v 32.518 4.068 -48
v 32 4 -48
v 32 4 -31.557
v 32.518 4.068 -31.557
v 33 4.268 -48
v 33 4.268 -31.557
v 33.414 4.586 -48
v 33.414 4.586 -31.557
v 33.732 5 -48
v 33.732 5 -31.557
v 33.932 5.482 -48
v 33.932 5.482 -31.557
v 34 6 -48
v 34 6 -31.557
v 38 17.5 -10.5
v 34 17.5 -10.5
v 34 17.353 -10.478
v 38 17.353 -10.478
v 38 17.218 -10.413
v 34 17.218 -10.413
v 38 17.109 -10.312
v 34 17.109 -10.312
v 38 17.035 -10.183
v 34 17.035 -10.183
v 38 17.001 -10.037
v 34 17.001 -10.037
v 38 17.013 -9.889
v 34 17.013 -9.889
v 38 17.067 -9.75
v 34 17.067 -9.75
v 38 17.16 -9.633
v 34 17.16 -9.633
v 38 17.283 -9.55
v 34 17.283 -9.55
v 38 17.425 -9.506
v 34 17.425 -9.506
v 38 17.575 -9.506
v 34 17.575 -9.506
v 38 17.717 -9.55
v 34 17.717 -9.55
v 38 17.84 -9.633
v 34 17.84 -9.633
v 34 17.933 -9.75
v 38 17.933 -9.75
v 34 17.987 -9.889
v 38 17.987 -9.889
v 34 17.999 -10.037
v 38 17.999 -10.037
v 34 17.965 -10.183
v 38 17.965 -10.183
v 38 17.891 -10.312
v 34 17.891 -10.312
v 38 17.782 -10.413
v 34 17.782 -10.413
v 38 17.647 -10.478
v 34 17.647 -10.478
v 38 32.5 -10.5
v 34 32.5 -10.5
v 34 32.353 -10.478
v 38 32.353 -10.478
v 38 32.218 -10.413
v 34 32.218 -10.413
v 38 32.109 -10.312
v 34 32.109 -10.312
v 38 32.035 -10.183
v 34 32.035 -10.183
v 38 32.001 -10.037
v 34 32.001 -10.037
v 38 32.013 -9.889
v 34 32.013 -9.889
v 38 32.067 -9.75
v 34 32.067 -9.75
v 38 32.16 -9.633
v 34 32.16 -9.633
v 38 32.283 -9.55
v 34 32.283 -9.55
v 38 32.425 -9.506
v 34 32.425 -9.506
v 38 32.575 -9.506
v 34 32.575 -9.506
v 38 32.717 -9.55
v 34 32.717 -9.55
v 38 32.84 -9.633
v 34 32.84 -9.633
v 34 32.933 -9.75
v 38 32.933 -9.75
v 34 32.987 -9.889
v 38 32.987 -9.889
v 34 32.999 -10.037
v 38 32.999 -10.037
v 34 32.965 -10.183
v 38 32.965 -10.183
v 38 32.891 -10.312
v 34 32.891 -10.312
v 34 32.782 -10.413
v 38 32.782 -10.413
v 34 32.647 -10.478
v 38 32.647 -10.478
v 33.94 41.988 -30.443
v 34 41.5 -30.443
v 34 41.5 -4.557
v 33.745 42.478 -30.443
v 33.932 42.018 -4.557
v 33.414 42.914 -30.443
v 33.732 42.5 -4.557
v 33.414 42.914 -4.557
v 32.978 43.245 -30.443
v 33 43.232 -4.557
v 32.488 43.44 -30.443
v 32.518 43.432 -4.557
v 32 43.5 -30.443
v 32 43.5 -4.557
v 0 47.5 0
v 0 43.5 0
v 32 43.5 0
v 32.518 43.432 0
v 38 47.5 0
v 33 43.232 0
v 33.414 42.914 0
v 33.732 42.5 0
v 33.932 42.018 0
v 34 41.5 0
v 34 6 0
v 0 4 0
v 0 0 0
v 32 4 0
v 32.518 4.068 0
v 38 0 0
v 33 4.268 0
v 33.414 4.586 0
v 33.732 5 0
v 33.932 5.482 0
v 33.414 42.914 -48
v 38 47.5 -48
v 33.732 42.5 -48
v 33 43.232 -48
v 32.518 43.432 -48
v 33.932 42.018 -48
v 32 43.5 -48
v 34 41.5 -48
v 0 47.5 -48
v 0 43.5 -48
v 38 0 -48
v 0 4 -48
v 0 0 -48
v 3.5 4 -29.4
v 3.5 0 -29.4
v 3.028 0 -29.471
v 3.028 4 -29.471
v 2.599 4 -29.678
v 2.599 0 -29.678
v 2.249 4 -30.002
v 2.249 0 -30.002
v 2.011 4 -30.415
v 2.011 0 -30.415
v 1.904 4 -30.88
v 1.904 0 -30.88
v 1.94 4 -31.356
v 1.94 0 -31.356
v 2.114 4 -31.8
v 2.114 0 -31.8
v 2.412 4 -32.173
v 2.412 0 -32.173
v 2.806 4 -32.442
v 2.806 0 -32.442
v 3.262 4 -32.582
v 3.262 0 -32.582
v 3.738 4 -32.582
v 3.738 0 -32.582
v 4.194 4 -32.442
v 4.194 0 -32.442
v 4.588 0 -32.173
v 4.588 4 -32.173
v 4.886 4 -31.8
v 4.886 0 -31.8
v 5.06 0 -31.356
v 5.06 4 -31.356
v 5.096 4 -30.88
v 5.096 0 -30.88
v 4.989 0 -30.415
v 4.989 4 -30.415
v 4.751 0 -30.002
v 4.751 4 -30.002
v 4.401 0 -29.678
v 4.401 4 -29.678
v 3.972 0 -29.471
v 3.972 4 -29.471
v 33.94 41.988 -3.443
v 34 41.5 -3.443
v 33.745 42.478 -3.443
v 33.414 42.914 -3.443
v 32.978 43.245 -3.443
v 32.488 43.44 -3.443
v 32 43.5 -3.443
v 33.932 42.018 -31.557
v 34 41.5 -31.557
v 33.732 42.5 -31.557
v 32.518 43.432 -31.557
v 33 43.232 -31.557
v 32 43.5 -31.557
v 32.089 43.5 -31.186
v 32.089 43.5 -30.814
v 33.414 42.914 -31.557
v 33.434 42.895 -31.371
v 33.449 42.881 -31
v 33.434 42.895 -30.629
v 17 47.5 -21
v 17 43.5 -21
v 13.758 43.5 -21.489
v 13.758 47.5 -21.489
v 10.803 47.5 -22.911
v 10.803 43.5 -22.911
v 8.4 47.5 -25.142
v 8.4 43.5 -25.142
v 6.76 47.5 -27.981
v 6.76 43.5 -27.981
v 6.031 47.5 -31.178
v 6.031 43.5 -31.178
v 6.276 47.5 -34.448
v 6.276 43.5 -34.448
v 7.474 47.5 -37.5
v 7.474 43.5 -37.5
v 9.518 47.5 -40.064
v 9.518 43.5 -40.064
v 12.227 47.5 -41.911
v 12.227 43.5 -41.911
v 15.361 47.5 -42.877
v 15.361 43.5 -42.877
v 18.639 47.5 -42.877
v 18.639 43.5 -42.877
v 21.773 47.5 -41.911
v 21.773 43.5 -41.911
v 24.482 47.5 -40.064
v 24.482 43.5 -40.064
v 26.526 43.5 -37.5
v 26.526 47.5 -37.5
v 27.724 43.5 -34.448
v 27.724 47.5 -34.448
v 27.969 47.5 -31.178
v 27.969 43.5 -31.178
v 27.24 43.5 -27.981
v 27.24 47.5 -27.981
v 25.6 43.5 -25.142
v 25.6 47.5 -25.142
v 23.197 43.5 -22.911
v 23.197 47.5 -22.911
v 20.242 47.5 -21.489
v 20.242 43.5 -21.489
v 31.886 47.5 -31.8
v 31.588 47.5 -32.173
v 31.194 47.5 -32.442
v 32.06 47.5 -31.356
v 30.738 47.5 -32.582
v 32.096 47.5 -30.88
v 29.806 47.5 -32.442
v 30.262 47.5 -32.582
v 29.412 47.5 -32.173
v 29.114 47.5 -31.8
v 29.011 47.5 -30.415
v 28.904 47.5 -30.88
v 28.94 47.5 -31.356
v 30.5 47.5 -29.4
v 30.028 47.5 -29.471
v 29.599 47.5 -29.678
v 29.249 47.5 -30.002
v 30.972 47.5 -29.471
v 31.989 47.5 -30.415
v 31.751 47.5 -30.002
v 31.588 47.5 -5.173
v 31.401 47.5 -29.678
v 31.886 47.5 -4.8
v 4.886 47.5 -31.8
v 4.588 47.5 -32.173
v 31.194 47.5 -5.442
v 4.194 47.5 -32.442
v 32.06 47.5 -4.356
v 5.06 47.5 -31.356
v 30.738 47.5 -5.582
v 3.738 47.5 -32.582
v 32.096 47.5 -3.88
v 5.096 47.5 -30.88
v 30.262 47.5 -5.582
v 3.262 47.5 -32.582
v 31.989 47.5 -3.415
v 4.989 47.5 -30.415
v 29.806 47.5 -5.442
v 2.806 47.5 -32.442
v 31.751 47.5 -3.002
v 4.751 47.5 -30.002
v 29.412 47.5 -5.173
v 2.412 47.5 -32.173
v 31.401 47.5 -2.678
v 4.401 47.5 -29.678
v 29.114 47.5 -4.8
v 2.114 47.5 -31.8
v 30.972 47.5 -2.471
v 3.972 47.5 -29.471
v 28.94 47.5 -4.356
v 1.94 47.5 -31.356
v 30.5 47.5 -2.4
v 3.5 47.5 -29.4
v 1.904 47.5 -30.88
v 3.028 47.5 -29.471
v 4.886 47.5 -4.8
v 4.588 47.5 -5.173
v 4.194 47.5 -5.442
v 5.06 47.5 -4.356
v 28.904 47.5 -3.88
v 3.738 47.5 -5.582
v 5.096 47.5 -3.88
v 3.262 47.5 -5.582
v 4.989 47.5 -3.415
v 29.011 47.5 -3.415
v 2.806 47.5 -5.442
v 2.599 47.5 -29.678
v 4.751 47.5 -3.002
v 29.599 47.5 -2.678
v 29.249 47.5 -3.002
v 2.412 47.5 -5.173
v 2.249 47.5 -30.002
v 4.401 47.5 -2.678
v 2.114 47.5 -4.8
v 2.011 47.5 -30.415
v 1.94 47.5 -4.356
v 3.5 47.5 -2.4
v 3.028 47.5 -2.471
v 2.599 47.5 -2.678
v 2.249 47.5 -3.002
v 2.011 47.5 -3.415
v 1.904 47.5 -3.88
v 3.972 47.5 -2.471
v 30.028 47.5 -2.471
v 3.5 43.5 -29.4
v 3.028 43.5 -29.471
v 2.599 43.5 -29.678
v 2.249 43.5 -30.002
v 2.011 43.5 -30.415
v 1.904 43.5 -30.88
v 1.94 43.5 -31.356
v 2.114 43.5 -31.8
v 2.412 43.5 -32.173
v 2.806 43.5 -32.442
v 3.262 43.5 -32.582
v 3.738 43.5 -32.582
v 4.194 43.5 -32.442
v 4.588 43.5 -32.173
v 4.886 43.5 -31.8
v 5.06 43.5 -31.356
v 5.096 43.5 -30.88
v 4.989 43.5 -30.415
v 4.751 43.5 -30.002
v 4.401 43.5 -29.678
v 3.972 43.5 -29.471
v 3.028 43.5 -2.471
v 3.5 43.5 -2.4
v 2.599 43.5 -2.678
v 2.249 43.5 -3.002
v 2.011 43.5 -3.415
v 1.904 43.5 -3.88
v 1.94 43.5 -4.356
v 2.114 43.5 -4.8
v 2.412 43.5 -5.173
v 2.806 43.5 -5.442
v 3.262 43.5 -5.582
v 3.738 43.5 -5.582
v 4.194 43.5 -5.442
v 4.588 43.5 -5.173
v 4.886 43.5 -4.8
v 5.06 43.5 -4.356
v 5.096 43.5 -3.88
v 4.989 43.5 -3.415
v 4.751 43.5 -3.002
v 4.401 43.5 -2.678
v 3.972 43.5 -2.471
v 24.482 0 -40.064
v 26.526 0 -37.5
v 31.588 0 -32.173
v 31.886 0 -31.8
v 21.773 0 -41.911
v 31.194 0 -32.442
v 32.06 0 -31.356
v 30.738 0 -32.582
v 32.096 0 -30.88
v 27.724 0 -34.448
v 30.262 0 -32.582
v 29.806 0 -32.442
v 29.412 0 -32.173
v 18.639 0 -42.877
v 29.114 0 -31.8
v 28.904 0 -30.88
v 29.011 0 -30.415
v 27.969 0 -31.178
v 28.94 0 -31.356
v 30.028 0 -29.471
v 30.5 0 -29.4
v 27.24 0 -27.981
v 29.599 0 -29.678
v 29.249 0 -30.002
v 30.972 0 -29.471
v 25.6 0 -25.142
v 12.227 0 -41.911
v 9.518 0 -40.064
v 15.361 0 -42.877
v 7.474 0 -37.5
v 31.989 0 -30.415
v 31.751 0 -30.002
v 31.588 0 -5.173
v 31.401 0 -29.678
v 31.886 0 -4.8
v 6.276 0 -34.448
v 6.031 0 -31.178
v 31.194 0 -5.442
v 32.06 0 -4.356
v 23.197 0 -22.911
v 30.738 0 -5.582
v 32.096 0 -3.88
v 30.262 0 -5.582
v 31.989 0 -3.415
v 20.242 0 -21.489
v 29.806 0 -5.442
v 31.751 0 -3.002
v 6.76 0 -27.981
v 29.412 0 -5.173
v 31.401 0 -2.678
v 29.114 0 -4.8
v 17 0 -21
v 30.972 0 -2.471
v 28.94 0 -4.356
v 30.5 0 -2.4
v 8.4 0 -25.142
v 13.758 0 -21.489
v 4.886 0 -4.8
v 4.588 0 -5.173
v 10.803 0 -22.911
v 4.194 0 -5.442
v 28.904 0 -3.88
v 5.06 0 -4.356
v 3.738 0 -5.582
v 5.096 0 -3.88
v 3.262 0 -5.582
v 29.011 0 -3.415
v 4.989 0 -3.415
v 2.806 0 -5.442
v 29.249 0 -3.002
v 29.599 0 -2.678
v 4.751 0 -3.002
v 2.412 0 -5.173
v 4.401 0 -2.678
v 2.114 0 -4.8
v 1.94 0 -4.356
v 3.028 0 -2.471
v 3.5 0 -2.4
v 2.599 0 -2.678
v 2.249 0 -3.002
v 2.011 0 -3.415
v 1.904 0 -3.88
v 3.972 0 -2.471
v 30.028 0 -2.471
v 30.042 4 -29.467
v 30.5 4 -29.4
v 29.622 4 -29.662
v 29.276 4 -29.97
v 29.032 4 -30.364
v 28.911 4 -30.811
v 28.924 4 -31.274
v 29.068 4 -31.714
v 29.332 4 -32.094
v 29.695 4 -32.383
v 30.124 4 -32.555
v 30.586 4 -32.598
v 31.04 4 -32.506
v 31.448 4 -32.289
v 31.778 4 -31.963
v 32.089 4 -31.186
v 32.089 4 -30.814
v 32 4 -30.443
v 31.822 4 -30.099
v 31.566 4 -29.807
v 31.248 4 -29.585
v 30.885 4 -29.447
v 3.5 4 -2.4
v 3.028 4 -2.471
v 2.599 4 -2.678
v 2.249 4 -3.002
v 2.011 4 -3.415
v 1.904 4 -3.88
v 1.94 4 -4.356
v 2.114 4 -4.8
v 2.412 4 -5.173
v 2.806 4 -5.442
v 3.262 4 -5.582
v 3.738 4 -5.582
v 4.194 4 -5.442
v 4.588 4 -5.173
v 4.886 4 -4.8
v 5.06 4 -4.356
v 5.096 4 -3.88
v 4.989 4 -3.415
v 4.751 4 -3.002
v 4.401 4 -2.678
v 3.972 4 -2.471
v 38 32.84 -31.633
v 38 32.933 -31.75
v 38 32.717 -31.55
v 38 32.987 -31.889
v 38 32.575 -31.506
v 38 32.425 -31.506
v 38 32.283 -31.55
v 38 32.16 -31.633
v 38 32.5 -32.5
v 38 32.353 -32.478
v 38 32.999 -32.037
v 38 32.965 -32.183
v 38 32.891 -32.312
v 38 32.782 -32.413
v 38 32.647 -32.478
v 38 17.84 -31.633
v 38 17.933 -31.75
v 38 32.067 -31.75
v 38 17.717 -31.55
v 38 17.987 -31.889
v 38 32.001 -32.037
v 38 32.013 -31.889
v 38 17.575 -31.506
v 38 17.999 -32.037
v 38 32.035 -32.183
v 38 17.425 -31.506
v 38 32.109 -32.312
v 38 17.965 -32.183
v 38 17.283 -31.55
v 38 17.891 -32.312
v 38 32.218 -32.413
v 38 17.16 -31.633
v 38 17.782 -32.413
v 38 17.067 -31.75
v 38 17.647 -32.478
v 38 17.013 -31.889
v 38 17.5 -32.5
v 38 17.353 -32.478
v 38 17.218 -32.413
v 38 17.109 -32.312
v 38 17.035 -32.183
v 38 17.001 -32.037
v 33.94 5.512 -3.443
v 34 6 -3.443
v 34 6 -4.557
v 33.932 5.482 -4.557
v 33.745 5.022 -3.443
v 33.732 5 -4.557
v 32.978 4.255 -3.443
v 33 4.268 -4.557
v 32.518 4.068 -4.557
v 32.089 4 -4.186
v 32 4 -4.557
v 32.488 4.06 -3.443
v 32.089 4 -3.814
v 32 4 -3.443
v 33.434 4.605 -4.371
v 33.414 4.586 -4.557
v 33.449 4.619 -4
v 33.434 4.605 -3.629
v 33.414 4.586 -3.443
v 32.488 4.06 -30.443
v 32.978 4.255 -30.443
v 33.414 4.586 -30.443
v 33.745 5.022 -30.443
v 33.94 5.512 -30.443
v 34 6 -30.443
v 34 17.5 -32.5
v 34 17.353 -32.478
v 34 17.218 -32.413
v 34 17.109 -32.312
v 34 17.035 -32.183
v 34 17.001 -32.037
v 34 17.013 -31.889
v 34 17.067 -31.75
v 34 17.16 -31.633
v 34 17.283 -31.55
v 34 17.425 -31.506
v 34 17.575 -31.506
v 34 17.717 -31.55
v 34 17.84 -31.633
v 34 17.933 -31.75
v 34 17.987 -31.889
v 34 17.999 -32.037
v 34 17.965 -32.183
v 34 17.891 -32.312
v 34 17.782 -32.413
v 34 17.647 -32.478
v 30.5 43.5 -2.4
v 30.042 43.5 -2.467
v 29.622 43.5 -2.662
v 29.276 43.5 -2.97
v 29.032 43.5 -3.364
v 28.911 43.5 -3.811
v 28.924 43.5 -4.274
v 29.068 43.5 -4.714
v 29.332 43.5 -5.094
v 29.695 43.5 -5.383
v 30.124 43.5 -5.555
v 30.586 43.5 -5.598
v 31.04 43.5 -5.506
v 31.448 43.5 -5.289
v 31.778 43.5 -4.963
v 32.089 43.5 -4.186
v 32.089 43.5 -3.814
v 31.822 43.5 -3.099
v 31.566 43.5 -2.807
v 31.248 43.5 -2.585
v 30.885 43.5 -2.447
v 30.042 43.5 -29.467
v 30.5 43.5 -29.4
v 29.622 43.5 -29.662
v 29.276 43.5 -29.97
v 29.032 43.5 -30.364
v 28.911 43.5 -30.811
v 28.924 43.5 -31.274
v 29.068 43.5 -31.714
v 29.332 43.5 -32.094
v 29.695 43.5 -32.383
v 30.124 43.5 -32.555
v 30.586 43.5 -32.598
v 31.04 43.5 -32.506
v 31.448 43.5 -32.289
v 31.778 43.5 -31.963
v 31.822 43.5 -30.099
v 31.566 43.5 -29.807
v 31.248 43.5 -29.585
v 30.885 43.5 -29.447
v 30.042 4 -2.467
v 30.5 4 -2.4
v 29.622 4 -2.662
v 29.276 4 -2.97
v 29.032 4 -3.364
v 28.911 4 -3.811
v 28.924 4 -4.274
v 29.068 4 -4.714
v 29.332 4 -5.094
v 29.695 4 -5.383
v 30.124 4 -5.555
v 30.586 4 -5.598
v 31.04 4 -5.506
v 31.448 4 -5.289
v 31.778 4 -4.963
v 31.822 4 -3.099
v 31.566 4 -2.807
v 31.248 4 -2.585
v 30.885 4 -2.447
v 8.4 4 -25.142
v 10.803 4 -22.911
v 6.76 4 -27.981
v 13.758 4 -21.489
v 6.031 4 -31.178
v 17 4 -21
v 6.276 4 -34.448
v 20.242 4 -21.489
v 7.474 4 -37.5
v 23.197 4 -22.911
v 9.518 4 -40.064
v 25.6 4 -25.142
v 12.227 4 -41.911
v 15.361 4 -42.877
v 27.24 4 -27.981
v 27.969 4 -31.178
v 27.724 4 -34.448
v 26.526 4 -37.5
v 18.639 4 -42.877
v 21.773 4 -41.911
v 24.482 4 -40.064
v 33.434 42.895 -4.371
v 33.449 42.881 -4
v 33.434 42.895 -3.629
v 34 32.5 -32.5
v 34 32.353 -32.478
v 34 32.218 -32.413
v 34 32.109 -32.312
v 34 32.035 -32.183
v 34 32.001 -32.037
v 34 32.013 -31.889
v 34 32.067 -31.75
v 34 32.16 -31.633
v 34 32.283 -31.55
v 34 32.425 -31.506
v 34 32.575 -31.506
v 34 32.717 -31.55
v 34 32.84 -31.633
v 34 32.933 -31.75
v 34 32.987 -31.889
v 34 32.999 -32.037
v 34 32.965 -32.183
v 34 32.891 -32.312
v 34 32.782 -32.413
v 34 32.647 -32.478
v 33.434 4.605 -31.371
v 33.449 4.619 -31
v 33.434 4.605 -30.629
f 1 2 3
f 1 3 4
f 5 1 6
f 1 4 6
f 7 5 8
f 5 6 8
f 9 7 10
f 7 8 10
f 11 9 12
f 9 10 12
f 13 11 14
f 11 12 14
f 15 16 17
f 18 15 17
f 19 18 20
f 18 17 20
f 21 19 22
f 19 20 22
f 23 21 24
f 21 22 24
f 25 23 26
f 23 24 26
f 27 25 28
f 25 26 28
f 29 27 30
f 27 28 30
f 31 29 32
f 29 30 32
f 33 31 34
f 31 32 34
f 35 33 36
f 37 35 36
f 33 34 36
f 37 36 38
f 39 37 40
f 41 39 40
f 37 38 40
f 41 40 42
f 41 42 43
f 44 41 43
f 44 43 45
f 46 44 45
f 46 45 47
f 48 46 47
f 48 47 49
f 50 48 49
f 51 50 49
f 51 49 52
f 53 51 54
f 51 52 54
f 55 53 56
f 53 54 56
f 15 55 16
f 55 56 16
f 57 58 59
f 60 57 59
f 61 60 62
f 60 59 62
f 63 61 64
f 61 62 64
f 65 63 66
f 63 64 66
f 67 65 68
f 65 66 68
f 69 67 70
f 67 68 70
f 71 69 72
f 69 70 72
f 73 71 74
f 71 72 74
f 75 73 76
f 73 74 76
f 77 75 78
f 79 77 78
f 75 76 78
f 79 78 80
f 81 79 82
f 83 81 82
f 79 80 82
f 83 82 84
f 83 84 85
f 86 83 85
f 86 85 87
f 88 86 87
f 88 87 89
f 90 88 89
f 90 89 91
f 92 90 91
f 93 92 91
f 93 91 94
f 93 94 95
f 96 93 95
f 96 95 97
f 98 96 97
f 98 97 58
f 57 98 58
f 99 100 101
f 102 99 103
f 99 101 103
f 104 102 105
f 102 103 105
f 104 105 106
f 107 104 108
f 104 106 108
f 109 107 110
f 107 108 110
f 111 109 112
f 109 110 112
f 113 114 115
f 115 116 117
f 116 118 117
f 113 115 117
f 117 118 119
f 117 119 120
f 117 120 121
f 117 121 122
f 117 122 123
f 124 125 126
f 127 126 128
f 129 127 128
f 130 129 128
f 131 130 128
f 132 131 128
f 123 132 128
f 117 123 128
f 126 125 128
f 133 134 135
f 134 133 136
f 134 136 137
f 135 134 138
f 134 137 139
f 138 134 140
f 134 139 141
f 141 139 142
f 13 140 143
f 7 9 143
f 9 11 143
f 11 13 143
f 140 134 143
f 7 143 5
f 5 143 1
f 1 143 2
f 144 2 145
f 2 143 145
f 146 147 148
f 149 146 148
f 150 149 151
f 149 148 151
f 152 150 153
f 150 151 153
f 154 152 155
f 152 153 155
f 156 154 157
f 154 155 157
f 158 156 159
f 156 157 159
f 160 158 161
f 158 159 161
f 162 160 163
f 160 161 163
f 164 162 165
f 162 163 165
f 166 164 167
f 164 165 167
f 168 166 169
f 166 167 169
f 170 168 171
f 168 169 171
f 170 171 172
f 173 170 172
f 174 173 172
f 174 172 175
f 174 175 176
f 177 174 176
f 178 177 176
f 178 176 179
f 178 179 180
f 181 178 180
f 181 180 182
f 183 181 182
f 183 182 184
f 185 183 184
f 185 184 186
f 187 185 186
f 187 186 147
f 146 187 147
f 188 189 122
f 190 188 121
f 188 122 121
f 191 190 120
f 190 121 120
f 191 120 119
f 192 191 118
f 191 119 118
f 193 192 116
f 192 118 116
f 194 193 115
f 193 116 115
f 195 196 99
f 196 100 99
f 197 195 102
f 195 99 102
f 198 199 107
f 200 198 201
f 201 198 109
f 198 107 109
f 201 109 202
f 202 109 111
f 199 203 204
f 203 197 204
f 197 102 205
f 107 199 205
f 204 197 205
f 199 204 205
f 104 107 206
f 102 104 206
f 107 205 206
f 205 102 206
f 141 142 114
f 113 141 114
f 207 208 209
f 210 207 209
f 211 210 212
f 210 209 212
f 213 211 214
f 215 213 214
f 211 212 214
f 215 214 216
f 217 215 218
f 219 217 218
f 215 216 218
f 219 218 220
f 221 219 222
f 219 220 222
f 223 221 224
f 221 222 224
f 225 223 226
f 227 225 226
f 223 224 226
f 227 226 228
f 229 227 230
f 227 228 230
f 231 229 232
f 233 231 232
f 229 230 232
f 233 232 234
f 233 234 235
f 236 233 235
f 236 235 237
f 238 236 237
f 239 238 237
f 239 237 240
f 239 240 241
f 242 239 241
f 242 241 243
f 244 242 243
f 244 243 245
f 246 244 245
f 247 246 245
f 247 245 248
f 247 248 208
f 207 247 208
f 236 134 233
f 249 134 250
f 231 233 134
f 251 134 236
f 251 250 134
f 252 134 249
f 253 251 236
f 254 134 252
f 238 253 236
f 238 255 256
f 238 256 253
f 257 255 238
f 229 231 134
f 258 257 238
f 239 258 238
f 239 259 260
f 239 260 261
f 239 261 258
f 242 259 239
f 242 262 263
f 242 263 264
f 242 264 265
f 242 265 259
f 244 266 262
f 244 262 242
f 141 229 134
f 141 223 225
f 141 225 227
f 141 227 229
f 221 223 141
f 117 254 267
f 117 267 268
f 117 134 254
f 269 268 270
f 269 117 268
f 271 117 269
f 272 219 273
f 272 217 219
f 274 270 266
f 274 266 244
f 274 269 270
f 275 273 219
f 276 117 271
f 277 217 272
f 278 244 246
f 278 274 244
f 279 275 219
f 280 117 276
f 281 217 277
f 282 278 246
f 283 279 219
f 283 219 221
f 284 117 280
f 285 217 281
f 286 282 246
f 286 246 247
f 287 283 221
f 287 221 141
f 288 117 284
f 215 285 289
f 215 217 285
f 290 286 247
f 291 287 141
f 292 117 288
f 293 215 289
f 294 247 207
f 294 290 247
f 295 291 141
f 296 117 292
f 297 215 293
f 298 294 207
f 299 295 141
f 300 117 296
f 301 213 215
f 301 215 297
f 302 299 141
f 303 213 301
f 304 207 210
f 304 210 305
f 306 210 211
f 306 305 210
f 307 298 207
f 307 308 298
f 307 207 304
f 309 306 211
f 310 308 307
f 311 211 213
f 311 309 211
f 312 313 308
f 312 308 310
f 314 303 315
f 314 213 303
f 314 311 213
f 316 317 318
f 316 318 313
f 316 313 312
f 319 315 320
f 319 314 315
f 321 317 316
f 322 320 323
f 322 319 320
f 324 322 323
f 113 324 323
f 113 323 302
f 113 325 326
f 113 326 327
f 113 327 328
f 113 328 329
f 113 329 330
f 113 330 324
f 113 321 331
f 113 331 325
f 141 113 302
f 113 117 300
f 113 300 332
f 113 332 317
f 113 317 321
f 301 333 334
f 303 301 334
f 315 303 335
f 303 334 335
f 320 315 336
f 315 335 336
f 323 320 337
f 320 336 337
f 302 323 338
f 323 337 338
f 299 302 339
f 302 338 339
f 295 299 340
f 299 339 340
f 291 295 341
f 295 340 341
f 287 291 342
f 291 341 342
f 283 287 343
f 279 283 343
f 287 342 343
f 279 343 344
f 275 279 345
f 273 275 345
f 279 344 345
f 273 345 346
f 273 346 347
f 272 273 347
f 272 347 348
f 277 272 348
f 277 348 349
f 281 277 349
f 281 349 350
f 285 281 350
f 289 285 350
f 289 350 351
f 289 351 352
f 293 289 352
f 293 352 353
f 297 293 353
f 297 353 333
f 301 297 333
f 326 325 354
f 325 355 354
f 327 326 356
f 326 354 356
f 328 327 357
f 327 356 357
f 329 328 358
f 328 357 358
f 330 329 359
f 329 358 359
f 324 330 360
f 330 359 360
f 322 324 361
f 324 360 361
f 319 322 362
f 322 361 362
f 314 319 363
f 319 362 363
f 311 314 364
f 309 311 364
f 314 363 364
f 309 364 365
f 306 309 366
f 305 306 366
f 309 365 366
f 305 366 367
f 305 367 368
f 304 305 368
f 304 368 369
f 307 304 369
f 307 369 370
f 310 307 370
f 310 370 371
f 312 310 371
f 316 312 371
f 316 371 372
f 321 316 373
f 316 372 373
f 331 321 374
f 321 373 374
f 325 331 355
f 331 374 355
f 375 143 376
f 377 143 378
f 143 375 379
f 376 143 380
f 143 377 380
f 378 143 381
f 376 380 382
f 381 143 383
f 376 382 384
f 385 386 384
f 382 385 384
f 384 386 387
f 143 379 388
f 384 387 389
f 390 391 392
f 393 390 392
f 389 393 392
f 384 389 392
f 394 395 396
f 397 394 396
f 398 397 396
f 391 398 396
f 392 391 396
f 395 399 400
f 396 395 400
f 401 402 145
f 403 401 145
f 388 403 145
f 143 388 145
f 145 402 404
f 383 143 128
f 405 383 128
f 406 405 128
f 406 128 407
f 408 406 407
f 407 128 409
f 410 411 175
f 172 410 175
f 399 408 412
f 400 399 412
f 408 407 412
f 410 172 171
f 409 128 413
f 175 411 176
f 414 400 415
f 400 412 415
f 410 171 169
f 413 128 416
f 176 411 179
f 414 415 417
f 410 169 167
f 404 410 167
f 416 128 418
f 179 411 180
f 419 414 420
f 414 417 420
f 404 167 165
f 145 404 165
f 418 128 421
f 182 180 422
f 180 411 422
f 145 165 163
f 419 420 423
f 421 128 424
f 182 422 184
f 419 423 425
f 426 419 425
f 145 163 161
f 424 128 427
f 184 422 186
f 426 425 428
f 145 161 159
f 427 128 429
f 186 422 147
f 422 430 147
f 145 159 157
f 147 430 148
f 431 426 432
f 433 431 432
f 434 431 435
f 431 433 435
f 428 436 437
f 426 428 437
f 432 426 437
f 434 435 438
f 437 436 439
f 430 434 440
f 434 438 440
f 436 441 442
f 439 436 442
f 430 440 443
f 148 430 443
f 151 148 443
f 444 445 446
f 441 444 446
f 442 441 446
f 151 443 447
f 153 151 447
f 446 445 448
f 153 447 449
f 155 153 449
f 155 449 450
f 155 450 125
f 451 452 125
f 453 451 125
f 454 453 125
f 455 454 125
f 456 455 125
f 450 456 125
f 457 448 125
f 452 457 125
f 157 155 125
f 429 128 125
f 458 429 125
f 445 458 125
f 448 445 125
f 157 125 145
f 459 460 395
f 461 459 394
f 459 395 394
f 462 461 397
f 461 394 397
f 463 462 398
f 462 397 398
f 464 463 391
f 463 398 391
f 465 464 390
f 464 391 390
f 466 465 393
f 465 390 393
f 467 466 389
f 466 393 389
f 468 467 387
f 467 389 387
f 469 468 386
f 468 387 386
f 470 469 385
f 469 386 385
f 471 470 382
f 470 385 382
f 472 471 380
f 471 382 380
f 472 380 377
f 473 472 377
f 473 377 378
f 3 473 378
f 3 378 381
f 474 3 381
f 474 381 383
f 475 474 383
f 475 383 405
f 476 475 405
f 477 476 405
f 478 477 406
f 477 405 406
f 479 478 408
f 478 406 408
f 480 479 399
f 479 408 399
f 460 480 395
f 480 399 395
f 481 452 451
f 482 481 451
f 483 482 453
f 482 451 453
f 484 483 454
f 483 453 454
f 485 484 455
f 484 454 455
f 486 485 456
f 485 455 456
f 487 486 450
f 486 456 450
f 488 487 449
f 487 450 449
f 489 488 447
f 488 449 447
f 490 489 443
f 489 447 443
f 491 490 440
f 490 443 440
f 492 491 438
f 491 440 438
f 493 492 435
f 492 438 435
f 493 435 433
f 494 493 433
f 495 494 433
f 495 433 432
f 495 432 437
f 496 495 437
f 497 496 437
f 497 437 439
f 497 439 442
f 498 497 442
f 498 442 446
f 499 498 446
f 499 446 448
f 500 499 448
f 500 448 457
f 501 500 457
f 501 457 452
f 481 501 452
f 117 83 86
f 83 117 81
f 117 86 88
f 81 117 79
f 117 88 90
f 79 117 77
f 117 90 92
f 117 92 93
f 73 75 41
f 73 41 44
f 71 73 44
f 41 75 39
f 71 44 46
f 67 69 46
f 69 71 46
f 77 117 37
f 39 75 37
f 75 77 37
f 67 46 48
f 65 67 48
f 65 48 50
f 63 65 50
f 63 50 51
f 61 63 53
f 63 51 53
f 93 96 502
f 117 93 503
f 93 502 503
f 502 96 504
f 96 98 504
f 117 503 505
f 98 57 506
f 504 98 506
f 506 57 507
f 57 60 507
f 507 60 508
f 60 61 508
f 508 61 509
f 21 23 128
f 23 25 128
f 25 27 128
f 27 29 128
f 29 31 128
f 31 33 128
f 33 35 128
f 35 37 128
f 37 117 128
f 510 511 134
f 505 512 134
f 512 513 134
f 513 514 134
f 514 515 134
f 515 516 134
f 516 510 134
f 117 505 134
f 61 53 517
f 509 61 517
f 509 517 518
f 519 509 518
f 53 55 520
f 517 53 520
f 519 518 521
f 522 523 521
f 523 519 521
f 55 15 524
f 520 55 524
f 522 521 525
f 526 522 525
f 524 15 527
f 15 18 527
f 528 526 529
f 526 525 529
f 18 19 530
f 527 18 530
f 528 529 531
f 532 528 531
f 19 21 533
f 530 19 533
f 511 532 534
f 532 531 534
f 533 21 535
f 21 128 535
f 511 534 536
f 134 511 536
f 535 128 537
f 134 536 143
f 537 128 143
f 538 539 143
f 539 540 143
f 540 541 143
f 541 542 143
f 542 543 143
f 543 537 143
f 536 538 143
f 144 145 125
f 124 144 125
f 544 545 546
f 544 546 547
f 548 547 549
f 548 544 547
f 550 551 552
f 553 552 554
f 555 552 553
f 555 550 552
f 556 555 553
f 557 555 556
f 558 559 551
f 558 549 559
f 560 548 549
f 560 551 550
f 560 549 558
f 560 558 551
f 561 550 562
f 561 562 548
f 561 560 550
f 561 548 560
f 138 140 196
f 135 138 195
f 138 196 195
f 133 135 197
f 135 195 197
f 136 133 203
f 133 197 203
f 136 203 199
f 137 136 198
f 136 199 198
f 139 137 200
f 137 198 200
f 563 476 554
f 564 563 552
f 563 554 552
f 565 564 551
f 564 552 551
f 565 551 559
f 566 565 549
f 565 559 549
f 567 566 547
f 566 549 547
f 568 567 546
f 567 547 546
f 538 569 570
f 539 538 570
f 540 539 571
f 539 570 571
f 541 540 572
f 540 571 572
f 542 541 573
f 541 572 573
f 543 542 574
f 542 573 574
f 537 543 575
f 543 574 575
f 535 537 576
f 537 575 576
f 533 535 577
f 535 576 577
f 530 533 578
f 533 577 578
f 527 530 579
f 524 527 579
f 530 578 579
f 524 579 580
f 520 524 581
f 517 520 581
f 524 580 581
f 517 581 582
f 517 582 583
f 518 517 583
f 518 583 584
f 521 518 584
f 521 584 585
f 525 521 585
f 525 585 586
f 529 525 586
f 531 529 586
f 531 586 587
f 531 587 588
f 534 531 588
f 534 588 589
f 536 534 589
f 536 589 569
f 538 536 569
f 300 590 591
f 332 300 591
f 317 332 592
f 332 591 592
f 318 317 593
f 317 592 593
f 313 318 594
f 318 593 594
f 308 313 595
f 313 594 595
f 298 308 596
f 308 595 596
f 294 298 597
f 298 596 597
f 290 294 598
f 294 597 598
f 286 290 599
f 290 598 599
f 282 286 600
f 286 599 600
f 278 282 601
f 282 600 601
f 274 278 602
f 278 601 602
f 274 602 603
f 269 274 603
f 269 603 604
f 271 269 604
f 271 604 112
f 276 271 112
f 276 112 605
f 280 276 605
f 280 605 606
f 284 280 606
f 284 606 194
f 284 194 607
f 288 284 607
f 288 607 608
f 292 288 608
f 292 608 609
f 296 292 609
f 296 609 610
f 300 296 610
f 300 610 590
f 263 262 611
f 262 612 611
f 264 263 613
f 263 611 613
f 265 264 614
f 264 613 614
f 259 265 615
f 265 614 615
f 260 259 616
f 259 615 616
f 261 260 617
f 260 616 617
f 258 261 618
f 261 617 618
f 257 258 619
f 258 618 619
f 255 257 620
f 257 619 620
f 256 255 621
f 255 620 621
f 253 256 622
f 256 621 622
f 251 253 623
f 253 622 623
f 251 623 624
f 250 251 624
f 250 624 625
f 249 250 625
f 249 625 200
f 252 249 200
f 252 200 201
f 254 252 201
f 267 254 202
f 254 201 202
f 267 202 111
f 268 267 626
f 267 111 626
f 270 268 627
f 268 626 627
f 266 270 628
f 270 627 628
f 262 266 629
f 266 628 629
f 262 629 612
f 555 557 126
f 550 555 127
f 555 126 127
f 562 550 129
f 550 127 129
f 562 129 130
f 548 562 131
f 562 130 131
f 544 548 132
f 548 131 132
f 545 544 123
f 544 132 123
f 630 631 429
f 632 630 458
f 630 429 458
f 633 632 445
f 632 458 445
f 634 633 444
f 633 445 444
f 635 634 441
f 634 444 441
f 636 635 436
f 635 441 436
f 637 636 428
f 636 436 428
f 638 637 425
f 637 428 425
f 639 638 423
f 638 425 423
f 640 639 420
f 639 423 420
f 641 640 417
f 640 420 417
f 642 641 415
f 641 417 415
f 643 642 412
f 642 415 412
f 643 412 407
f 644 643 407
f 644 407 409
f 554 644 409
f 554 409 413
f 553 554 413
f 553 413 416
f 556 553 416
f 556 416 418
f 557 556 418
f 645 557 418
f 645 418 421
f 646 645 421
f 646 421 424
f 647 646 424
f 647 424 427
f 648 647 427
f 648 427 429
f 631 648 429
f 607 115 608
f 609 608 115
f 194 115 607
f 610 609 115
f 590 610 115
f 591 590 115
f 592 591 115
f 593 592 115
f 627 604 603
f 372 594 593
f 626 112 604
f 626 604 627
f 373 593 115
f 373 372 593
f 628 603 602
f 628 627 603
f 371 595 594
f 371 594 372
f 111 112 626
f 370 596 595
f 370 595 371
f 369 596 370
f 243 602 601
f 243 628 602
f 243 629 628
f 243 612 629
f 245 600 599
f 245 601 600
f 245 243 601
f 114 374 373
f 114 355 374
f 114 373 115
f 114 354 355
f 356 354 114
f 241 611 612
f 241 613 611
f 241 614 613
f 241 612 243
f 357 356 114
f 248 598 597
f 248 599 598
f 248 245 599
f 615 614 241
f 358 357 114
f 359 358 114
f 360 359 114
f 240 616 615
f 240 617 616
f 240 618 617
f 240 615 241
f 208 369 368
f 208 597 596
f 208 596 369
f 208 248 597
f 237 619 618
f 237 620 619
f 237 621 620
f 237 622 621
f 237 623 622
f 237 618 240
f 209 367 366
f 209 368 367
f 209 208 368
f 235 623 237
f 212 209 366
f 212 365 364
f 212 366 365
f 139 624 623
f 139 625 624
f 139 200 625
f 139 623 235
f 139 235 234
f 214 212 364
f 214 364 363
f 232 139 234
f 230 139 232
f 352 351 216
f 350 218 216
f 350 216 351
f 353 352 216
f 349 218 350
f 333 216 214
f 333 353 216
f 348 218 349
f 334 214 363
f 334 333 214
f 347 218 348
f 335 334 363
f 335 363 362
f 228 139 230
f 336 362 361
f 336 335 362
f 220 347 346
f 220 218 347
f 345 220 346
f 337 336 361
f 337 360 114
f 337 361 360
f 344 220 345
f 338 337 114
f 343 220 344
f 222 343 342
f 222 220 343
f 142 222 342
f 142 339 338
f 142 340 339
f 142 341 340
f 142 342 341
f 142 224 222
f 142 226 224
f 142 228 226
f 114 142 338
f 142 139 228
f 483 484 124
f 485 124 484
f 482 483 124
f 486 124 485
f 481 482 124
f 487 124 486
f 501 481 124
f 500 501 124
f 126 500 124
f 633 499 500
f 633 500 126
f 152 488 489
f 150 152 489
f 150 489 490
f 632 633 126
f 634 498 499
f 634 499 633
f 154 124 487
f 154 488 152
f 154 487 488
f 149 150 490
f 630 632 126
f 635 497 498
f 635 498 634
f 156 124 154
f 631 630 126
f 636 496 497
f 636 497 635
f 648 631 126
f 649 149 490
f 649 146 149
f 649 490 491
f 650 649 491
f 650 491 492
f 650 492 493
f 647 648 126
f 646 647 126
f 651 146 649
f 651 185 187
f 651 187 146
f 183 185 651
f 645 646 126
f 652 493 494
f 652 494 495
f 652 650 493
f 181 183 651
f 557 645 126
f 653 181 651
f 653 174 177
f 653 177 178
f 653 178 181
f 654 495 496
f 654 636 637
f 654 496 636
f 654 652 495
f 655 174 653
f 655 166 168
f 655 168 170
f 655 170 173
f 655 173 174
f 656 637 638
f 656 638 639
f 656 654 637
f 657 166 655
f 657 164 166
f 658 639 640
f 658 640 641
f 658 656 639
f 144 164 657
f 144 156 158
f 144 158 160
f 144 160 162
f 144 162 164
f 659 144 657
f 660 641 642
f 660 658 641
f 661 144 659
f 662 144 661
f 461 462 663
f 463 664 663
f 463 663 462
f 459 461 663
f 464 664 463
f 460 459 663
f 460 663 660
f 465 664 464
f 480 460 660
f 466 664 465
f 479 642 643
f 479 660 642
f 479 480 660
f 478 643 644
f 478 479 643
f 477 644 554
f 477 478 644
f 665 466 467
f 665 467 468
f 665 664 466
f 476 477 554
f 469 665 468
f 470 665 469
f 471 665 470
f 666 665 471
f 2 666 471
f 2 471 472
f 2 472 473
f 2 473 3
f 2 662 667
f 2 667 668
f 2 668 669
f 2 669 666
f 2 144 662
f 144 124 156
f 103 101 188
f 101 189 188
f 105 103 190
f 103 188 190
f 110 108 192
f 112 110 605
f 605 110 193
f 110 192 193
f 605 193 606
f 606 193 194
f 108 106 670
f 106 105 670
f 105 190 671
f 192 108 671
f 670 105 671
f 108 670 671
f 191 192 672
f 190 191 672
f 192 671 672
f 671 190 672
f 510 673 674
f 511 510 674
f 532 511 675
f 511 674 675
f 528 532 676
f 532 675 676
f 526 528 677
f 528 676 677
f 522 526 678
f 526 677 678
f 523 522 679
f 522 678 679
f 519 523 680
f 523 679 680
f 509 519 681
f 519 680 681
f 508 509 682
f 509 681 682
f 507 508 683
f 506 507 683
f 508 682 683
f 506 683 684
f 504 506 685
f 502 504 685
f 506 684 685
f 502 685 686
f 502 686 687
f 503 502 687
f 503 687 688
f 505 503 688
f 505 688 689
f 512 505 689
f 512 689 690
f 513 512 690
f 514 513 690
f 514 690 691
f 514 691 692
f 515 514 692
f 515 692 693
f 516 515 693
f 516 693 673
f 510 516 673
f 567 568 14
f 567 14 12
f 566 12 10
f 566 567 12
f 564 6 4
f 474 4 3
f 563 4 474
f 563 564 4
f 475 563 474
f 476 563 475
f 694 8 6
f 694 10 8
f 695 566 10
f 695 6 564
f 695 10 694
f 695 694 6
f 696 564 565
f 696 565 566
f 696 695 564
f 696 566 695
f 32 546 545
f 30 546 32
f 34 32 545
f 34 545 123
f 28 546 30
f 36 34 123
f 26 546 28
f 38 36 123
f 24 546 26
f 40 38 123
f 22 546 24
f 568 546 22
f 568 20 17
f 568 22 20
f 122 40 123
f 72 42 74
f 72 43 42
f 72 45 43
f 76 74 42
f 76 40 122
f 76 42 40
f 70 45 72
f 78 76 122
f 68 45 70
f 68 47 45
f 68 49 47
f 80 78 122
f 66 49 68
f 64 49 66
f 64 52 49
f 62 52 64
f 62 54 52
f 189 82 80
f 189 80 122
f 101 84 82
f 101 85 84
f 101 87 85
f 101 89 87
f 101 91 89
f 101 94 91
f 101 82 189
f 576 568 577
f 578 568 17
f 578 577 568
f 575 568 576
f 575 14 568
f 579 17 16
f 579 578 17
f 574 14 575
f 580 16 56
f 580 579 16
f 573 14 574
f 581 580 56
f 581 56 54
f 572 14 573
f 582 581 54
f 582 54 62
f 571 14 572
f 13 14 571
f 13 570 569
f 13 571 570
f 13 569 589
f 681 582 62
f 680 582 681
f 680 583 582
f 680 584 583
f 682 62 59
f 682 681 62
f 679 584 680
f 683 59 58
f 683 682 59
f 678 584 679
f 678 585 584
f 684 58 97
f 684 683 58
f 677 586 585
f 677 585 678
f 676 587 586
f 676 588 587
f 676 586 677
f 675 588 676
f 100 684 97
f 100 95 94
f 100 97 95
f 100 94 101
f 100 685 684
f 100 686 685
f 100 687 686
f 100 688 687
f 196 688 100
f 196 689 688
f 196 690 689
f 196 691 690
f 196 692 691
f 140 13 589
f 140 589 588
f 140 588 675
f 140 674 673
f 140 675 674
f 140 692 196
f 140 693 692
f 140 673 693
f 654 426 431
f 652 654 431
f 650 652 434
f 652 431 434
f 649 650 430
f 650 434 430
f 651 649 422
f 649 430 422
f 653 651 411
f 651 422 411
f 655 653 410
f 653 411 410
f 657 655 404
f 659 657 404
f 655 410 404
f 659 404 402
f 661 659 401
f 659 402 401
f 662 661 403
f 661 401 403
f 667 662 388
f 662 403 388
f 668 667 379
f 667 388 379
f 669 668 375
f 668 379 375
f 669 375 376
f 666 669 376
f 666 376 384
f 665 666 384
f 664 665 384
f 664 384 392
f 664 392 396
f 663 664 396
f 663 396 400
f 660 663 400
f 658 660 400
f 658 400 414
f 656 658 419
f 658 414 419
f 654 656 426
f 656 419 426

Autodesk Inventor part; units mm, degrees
ref_plane "YZ Plane" through (0, 0, 0) normal (1, 0, 0) x (0, 1, 0)
ref_plane "XZ Plane" through (0, 0, 0) normal (0, 1, 0) x (-1, 0, 0)
ref_plane "XY Plane" through (0, 0, 0) normal (0, 0, 1) x (1, 0, 0)
sketch "スケッチ1" plane through (0, 0, 0) normal (0, 1, 0) x (-1, 0, 0)
  line L0 (0, 0) -> (-38, 0)
  line L1 (-38, 0) -> (-38, -48)
  line L2 (-38, -48) -> (0, -48)
  line L3 (0, -48) -> (0, 0)
  dimension "d0" = 48
  dimension "d1" = 38
extrude "押し出し1" add sketch "スケッチ1" along normal blind 47.5
sketch "スケッチ2" plane through (38, 0, -48) normal (0, 0, -1) x (-1, 0, 0)
  line L0 (4, 43.5) -> (59.072, 43.5)
  line L1 (59.072, 43.5) -> (59.072, 4)
  line L2 (59.072, 4) -> (4, 4)
  line L3 (4, 4) -> (4, 43.5)
  line L4 (0, 47.5) -> (38, 47.5) projected
  line L5 (0, 0) -> (38, 0) projected
  line L6 (0, 0) -> (0, 47.5) projected
  dimension "d4" = 39.5
  dimension "d6" = 4
  dimension "d7" = 4
extrude "押し出し2" cut sketch "スケッチ2" against normal blind 100
sketch "スケッチ3" plane through (0, 47.5, 0) normal (0, 1, 0) x (1, 0, 0)
  line L0 (38, 48) -> (0, 48) projected
  line L1 (38, 0) -> (38, 48) projected
  point P0 (0, 0)
  point P1 (17, 32)
  dimension "d10" = 16
  dimension "d11" = 21
hole "穴1" at (17, 47.5, -32) direction (0, -1, 0) diameter 22 end through all
sketch "スケッチ4" plane through (0, 47.5, 0) normal (0, 1, 0) x (1, 0, 0)
  line L0 (0, 0) -> (38, 0) projected
  line L1 (38, 0) -> (38, 48) projected
  point P0 (30.5, 4)
  point P1 (30.5, 31)
  point P2 (3.5, 4)
  point P3 (3.5, 31)
  point P4 (3.5, 4)
  dimension "d19" = 4
  dimension "d20" = 7.5
  dimension "d23" = 27
  dimension "d26" = 27
hole "穴2" at (30.5, 47.5, -4) at (30.5, 47.5, -31) at (3.5, 47.5, -31) at (3.5, 47.5, -4) direction (0, -1, 0) diameter 3.2 end through all
sketch "スケッチ6" plane through (38, 0, 0) normal (1, 0, 0) x (0, 0, -1)
  line L0 (0, 47.5) -> (48, 47.5) projected
  line L1 (0, 0) -> (0, 47.5) projected
  point P0 (10, 32.5)
  point P1 (32, 32.5)
  point P2 (10, 17.5)
  point P3 (32, 17.5)
  dimension "d45" = 15
  dimension "d46" = 10
  dimension "d49" = 22
  dimension "d52" = 15
hole "穴4" at (38, 32.5, -10) at (38, 32.5, -32) at (38, 17.5, -10) at (38, 17.5, -32) direction (-1, 0, 0) diameter 1 end through all
fillet "フィレット1" radius 2 2 edges at (34, 4, -24) (34, 43.5, -24)
properties part number "サーボモータ固定２軸"
